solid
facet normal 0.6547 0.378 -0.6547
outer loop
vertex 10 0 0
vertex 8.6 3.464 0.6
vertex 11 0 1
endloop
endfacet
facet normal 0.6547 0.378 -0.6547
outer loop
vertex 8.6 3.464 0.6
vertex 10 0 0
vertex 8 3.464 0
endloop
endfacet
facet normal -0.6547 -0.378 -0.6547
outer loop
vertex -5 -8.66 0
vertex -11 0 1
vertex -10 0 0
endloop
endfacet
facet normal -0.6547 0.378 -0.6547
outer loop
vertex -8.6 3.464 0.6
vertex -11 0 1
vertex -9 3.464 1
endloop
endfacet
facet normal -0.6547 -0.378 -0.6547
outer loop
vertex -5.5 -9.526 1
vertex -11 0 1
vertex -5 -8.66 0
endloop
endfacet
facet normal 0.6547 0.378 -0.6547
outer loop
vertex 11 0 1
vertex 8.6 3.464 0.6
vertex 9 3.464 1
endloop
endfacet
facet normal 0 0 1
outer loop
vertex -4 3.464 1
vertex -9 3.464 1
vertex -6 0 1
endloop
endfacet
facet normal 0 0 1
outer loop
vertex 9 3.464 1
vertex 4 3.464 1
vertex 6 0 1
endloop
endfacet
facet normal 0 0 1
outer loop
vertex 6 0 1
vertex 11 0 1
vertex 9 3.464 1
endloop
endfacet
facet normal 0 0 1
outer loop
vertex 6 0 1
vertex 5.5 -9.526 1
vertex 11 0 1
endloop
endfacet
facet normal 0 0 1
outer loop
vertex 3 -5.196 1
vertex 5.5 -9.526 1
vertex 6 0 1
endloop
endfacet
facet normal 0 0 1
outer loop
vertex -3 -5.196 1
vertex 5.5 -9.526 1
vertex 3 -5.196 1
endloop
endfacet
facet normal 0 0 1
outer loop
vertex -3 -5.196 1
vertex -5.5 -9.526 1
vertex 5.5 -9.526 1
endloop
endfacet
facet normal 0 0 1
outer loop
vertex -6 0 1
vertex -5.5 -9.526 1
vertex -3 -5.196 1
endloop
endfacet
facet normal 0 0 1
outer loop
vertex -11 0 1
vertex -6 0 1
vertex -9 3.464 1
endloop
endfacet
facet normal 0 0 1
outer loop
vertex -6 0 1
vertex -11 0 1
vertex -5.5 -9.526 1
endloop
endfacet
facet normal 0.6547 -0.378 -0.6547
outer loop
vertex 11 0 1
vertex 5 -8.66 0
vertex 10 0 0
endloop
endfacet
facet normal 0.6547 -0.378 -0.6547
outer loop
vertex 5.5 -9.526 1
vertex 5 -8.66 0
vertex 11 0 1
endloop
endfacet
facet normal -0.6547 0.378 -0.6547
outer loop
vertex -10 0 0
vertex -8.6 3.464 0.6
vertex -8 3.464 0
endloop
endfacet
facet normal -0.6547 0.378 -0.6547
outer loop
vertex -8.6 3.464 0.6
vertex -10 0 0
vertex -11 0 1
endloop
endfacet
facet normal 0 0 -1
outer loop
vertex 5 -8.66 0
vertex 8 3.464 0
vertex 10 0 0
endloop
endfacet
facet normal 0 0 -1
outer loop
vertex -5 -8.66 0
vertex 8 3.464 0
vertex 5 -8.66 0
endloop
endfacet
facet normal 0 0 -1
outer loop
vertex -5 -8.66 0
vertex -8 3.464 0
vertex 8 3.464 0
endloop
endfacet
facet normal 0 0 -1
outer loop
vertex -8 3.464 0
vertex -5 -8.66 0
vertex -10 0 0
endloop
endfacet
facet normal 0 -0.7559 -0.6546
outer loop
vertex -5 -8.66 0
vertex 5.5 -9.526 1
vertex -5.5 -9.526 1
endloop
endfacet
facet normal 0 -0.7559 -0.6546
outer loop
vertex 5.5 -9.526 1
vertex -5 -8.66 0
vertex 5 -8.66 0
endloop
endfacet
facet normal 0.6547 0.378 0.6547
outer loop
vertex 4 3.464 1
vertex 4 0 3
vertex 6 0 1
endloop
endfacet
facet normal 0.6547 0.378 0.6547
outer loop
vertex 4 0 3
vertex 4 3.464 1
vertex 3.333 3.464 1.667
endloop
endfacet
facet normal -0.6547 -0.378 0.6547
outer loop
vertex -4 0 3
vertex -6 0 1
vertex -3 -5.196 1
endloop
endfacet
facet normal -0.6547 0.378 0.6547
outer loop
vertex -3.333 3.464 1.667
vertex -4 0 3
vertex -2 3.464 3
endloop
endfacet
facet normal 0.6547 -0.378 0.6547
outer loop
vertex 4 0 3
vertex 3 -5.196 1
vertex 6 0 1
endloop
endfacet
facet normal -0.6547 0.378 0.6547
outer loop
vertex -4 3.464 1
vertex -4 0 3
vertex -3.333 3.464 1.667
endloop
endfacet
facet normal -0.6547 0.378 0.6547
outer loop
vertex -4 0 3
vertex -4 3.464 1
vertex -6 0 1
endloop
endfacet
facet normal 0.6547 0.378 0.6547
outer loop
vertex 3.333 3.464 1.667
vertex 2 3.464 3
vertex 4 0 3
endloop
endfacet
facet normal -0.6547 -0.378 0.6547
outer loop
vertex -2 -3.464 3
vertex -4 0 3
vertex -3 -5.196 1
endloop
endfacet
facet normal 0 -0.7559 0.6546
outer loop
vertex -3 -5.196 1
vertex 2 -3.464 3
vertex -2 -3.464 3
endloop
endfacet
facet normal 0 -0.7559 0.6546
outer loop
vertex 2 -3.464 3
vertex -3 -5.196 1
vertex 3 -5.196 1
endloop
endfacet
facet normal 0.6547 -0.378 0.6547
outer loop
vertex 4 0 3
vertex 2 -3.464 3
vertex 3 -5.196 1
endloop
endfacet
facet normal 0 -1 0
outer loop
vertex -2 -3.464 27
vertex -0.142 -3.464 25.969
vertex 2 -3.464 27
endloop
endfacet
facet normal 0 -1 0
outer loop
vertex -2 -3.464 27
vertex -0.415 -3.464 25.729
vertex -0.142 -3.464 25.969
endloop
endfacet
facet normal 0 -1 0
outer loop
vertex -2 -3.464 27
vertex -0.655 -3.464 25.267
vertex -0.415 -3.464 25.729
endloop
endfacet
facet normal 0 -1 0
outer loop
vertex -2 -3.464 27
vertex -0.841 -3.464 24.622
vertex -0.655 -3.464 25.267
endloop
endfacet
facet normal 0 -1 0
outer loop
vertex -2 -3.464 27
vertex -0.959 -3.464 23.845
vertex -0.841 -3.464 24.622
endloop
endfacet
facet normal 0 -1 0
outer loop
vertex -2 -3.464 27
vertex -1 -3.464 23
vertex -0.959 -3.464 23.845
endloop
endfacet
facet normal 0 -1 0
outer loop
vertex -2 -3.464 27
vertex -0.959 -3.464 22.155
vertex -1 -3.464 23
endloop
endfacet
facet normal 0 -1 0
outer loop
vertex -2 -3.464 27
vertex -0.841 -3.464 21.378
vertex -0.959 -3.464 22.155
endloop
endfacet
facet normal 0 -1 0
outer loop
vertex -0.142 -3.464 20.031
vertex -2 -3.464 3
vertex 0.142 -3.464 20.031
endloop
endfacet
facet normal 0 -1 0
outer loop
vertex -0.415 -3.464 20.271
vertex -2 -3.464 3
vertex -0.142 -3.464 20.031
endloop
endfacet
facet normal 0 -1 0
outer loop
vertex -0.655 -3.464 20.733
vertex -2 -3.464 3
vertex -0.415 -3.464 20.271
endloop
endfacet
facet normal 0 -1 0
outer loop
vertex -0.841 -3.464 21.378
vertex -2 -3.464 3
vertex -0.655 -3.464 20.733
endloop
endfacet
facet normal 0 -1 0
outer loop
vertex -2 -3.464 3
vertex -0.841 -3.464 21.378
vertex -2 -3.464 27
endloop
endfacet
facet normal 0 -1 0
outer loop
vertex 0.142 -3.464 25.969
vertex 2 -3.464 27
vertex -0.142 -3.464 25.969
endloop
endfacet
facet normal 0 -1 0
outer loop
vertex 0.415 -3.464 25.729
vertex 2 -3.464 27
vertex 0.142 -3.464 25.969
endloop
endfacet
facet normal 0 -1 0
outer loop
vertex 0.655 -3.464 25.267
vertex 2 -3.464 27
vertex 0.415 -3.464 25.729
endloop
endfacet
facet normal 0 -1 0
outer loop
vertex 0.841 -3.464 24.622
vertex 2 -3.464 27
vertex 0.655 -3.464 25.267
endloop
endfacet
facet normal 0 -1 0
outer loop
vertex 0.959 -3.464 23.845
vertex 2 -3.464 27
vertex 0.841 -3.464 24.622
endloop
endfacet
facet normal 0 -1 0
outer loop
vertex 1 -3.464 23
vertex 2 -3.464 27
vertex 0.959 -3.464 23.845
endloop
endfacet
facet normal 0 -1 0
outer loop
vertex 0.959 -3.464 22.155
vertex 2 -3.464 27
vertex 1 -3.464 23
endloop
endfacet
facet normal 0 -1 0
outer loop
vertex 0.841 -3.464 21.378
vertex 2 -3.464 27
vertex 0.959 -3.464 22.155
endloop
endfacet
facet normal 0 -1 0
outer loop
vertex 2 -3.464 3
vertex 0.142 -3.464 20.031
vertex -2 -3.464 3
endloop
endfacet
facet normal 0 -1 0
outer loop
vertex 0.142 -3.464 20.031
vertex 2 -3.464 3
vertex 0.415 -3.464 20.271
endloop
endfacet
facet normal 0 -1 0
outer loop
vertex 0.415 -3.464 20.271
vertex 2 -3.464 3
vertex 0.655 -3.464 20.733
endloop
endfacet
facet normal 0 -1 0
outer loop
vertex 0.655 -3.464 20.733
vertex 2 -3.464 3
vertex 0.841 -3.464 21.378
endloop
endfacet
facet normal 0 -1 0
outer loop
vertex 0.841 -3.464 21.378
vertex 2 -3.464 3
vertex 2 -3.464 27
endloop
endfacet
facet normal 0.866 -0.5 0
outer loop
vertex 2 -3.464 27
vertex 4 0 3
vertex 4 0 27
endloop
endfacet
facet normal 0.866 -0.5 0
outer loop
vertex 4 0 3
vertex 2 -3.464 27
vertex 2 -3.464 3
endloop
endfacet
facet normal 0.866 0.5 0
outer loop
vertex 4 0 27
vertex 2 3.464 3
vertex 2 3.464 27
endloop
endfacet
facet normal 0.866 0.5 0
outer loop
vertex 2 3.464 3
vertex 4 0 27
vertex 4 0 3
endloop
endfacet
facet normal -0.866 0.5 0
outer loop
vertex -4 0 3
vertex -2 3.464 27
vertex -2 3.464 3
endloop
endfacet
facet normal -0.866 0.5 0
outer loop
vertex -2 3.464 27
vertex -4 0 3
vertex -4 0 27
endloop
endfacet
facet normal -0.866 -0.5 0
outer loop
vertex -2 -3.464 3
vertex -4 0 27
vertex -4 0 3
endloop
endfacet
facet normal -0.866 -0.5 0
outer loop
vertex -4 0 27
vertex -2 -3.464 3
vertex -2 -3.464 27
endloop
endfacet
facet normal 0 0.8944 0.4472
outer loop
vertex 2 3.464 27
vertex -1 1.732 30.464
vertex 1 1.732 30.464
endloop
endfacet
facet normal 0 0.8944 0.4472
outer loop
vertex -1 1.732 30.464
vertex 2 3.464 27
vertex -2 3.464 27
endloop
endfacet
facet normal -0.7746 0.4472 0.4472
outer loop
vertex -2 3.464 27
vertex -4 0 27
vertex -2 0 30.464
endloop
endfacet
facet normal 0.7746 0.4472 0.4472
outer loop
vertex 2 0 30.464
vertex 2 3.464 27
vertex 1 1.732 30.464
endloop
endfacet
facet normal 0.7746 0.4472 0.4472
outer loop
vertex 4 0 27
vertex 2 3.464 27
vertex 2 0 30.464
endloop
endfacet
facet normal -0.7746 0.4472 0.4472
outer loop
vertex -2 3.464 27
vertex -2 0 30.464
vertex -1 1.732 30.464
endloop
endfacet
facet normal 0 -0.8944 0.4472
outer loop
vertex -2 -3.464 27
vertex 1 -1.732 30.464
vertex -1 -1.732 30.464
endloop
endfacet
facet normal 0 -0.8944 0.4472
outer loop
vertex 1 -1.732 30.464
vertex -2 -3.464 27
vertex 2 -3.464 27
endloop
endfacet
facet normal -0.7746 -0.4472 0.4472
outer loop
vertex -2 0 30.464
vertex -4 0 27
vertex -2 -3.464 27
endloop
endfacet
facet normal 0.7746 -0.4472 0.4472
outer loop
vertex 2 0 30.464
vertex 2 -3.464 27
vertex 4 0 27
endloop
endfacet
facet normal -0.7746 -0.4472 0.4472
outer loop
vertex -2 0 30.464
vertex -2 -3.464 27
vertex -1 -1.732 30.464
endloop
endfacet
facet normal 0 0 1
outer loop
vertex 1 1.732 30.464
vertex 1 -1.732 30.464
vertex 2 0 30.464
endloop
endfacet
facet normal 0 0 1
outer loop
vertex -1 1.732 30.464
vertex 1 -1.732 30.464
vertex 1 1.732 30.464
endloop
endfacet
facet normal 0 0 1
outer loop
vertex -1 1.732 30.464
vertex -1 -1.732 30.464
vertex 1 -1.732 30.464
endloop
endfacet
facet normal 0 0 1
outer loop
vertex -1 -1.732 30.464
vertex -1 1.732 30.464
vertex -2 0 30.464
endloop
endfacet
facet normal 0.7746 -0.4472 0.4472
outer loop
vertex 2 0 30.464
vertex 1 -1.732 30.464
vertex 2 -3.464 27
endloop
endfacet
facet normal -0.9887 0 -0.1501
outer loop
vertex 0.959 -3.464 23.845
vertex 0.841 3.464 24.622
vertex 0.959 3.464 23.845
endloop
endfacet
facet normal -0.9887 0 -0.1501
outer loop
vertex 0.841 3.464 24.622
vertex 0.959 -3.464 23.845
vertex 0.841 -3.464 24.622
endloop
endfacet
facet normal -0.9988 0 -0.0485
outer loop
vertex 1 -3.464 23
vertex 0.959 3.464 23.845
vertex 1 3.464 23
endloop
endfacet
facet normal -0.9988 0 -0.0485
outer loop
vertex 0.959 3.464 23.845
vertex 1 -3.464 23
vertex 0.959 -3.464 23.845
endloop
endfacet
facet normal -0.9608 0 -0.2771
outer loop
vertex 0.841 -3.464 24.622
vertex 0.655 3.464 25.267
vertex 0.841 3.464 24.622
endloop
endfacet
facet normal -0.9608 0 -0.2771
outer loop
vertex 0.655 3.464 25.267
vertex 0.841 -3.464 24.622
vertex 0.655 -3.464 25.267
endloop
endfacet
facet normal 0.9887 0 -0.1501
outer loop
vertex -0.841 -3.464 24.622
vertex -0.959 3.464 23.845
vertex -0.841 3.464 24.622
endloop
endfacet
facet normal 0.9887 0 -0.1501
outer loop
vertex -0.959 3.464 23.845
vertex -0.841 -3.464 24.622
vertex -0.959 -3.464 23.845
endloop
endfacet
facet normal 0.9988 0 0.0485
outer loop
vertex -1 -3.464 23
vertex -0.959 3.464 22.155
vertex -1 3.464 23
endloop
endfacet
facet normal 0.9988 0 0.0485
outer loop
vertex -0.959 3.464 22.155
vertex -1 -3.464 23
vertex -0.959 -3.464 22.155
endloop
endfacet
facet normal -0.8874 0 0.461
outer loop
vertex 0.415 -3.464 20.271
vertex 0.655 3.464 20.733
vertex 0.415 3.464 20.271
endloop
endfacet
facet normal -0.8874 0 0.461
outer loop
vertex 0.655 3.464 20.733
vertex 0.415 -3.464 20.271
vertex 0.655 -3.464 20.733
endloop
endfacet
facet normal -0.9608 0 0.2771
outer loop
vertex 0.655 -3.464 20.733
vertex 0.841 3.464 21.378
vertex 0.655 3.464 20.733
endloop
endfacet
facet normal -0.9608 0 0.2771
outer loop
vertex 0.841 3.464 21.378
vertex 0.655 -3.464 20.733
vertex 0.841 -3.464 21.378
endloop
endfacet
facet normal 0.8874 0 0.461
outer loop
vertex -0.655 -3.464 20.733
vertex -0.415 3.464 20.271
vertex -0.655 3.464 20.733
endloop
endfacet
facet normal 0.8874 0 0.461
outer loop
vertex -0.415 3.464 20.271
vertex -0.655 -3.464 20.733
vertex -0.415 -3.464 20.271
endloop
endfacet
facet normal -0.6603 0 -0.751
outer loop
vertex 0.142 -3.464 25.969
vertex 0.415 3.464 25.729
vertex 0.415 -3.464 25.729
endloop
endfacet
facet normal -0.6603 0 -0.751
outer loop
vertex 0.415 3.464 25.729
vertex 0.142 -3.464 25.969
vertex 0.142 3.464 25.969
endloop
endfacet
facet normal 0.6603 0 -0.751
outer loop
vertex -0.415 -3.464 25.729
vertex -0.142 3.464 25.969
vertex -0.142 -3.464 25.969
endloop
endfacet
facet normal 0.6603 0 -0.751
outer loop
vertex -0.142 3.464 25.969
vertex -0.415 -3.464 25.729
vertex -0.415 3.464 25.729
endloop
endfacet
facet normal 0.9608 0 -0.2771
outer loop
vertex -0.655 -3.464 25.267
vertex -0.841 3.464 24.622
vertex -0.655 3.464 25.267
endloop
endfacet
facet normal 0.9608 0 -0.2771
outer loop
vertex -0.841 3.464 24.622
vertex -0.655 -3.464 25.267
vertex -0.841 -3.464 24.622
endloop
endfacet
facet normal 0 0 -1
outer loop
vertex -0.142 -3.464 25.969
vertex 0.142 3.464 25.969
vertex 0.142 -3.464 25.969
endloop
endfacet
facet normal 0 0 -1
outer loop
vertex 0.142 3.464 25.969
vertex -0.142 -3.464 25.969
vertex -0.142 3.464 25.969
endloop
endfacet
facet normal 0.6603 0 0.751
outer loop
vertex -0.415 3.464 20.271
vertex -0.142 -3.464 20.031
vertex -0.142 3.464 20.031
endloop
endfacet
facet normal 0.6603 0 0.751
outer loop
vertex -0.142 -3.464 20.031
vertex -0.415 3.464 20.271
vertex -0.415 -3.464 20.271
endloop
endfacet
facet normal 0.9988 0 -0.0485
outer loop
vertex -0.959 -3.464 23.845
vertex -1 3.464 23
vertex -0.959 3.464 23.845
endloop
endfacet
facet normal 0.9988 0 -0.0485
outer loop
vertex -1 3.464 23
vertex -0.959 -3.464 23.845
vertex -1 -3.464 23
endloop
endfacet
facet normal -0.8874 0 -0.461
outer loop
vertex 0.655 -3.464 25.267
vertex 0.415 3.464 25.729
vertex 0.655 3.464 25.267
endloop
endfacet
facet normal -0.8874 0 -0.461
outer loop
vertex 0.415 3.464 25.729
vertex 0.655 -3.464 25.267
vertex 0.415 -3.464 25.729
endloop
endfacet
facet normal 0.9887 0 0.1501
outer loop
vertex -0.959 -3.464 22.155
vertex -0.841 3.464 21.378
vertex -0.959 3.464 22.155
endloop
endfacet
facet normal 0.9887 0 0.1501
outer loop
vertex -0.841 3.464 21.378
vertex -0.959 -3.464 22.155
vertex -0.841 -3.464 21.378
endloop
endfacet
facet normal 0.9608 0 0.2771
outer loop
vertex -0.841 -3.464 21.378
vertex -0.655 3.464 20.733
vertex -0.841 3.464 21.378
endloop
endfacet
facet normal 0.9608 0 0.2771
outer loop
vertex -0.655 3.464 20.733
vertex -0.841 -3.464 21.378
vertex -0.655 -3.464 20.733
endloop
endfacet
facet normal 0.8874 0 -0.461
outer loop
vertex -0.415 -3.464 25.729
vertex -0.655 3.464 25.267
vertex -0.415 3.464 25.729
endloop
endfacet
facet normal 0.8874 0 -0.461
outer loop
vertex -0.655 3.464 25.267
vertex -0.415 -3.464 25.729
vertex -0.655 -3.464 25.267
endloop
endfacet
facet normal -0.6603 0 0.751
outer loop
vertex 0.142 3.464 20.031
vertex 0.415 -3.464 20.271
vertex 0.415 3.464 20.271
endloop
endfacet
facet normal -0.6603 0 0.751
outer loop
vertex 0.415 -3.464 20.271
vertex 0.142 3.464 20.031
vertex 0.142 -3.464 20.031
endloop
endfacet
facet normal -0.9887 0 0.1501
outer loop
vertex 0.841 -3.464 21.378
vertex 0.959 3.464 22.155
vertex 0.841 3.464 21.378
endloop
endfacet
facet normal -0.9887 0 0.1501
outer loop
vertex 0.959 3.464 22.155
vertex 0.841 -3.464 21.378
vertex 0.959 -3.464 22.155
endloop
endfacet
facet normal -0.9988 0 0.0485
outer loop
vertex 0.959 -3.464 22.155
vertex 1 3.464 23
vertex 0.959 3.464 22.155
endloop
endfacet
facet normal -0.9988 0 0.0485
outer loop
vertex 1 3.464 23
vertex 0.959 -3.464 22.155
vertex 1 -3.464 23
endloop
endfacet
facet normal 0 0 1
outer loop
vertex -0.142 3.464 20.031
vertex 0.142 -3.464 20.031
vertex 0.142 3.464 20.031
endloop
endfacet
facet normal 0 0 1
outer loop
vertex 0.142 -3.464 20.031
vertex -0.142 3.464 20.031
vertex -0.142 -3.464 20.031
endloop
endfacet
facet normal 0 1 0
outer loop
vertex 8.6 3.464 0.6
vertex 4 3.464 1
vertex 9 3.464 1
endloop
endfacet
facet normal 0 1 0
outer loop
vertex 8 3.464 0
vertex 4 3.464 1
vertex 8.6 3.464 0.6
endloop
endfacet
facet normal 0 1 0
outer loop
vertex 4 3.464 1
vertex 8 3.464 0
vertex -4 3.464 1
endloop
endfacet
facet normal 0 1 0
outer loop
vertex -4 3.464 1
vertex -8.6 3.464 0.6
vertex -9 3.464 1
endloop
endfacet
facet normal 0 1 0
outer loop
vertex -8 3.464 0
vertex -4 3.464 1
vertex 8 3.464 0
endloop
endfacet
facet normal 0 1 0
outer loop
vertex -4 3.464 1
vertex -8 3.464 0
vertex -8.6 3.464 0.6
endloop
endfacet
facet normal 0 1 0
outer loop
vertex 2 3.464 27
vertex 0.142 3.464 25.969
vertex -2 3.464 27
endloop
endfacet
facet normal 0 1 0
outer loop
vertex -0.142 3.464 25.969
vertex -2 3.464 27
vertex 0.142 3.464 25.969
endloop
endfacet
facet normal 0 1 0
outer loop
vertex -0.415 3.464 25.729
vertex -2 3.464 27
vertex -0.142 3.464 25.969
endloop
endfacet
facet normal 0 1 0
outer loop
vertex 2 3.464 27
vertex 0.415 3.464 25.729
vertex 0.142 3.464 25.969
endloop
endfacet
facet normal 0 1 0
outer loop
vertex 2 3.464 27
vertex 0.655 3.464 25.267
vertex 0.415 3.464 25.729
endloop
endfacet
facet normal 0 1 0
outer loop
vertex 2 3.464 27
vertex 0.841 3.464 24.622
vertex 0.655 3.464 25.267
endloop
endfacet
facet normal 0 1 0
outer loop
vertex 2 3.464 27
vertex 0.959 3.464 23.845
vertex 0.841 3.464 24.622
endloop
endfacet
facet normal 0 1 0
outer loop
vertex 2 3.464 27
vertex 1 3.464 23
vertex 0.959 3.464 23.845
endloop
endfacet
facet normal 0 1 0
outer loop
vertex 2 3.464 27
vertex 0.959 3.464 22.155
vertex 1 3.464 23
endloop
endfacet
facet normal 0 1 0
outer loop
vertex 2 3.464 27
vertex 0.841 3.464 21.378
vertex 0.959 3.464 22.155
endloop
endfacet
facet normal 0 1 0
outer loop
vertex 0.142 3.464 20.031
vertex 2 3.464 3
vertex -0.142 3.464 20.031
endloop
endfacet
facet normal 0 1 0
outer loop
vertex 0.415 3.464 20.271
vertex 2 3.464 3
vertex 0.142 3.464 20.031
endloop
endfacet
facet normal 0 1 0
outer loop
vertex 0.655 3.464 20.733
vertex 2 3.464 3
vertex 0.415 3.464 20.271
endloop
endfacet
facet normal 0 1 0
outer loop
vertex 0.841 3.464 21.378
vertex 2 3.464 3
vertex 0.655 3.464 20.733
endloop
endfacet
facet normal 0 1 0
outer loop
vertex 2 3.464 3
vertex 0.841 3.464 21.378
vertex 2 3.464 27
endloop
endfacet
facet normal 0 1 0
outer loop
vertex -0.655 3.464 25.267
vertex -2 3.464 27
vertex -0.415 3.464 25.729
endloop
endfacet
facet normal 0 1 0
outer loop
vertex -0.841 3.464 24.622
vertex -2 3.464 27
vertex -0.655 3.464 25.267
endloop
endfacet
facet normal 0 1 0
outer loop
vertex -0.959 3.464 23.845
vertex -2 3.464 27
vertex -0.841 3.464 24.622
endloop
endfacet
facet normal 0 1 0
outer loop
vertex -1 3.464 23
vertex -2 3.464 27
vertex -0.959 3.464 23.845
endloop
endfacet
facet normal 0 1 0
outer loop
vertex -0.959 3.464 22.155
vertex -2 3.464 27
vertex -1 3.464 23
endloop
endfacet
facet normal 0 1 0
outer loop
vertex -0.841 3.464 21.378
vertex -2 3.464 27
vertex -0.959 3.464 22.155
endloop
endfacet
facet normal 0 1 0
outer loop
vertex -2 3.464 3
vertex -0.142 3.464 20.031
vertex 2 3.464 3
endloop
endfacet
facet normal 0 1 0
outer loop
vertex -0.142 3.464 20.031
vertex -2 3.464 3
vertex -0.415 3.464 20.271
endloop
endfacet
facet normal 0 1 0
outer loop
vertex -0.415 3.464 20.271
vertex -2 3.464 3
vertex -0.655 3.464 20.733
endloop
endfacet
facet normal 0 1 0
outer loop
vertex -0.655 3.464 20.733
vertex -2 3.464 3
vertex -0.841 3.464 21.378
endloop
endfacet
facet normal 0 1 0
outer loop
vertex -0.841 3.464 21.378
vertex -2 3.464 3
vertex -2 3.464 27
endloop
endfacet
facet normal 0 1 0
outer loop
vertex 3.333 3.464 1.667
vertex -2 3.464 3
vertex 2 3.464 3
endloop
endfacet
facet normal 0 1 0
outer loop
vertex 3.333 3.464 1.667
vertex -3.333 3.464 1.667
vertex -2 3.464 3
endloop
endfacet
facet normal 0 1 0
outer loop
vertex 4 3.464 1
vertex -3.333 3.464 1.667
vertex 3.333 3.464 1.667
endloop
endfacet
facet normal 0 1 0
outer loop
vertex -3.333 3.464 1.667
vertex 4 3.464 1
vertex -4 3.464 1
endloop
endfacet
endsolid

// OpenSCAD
//=========================================================
// wings.scad
//
// parts for folding wings
//
// Dr Tom Flint, 6 Jan 2023
//=========================================================

use <../Parts/threads.scad>


layer = 0.3;        // thickness of 1 layer
thick = 4*layer;    // thickness of the hub

rbasehole = 7;
rflange = 10;
rwasher = 15;
space = 11;

rlever = 30.2/2;
rinner = 25.0/2;

zlever = 9;

hi = space+2*thick;
F=200;

tall=26;

//---------------------------------------------------------
module pivota(){

  difference(){
    union(){
      cylinder(r=rbasehole-0.3,h=hi,$fn=F);
      translate([0,0,hi])
      cylinder(r1=rflange,r2=rflange+1,h=thick,$fn=F);
    }
    
    
    metric_thread (diameter=10, pitch=2, length=hi-1, internal=true);
    translate([0,0,hi+thick])
    cube([2,7,10],center=true);
  }
}

//---------------------------------------------------------
module pivotb(){

$fn=89;

  difference(){
    metric_thread (diameter=9.25, pitch=2, length=hi-2, internal=false, leadin=1);
    cylinder(r=2,h=2*hi,center=true,$fn=22);
  }
  difference(){
    translate([0,0,-thick])
    cylinder(r1=rflange+1,r2=rflange,h=thick,$fn=F);
    translate([0,0,-thick])

    cube([2,4,10],center=true);
  }

}

//--------------------------------------------------------------
module levera(){


    difference(){
      union(){
        cylinder(r=rlever+thick,h=zlever,$fn=F);
        cylinder(r1=rlever+thick+8,r2=rlever+8,h=thick,$fn=F);
        translate([0,0,thick])
        cylinder(r1=rlever+thick+2,r2=rlever+thick,h=2,$fn=F);
      }
      translate([0,0,-1])
      cylinder(r=rlever,h=zlever+2,$fn=F);
      translate([0,0,0.5*zlever])
      rotate([90,0,0])
      cylinder(r=2,h=50,center=true,$fn=45);

        translate([0,0,0])
        cylinder(r1=rlever+1,r2=rlever,h=1,$fn=F);
    }
      
}

//--------------------------------------------------------------
module leverb(){


    difference(){
      union(){
        cylinder(r=rinner,h=zlever,$fn=F);
      }
      translate([0,0,thick])
      cylinder(r=rinner-thick,h=zlever+2,$fn=F);
      cylinder(r1=rinner-2*thick,r2=rinner-thick,h=thick,$fn=F);

      translate([0,0,zlever/2])
      rotate([90,0,0])
      cylinder(r=2,h=50,center=true,$fn=45);
    }
    difference(){
      hull(){
        translate([0,0,-thick])
        cylinder(r=rinner+4*thick,h=thick,$fn=F);
        translate([0,50,-thick])
        cylinder(r=rinner/2,h=thick,$fn=F);
      }
      translate([0,0,-thick])
      cylinder(r=rinner-3*thick,h=20,center=true,$fn=F);
      translate([0,50,-thick])
      cylinder(r=2.5,h=20,center=true,$fn=F);
      translate([0,37,-thick])
      cylinder(r=4,h=20,center=true,$fn=F);
      translate([0,22,-thick])
      cylinder(r=6,h=20,center=true,$fn=F);
    }
}

//--------------------------------------------------------------
module washer(){

    difference(){
      cylinder(r1=rwasher,r2=rwasher+2*thick,h=2*thick,$fn=F);
      cylinder(r1=rflange+1,r2=rflange,h=thick,$fn=F);
      cylinder(r=rbasehole,h=hi,$fn=F);
    }
      
}

//---------------------------------------------------------
module pivotc(extra=9){


$fn=89;
  difference(){
    union(){
      translate([0,0,extra])
      metric_thread (diameter=9.25, pitch=2, length=hi-2, internal=false, leadin=1);
      cylinder(r=rbasehole-0.3,h=extra,$fn=F);
      translate([0,0,-thick])
      cylinder(r1=rflange+1,r2=rflange,h=thick,$fn=F);
    }
    
    translate([0,0,extra])
    cylinder(r=2,h=2*hi,center=true,$fn=22);
    translate([0,0,0])
    cylinder(r1=4,r2=2,h=0.75*extra,$fn=22);
    translate([0,0,-thick])
    cube([2,8,2*thick],center=true);
  }

}

//--------------------------------------------------------------
module washer2(){

    difference(){
      cylinder(r1=rwasher,r2=rwasher+2*thick,h=3*thick,$fn=F);
      translate([0,0,-0.1])
      cylinder(r1=rflange+2*thick,r2=rflange,h=2*thick+0.1,$fn=F);
      cylinder(r=rbasehole,h=hi,$fn=F);
    }
      
}


//------------------------------------------------------------
module pivotd(){

  difference(){
    union(){
      cylinder(r=rbasehole-0.15,h=tall,$fn=F);
      translate([0,0,-2*thick])
      cylinder(r1=rflange+2*thick,r2=rflange,h=2*thick,$fn=F);
  
      
      translate([thick,0,tall])
      cylinder(r1=rbasehole,r2=rbasehole-thick,h=2*thick,$fn=F);
      translate([-thick,0,tall])
      cylinder(r1=rbasehole,r2=rbasehole-thick,h=2*thick,$fn=F);
    }
    
    // cut for compression
    translate([0,0,tall])
    cube([2*thick,20,tall],center=true);
    
    // round out compression cut for stress relief
    translate([0,0,0.5*tall])
    rotate([90,0,0])
    cylinder(r=thick,h=20,center=true,$fn=F);

    // side cut to make printable
    translate([0,10,0.5*tall])
    cube([20,10,2*tall],center=true);
    
    // divot to help install tabs
    translate([3.5,0,tall+1])
    cylinder(r=0.6,h=2*thick,$fn=F);

    // divot to help install tabs
    translate([-3.5,0,tall+1])
    cylinder(r=0.6,h=2*thick,$fn=F);

  }
}

//---------------------------------------------------------
module wedged(){

    translate([0,0,tall/2+5])
    //cube([2*thick-0.15,2*rbasehole-0.3,0.5*tall],center=true);
    linear_extrude(height=0.5*tall,scale=[1.3,1])
    square([2*thick-0.15-0.5,2*rbasehole-0.3-0.5],center=true);

    translate([0,0,tall+4])
    cube([2*thick-0.15,2*rbasehole+2*thick,2*thick],center=true);
}


//---------------------------------------------------------
module anchor(){
  
hi=24;
  
  difference(){
    union(){
      cylinder(r1=10,r2=11,h=1,$fn=44);
      translate([0,0,1])
      cylinder(r1=6,r2=4,h=2,$fn=44);
      translate([0,0,3])
      cylinder(r=4,h=hi,$fn=44);
      translate([0,0,hi+3])
      sphere(r=4,$fn=33);
    }
    translate([0,0,hi-1])
    rotate([0,90,0])
    scale([1.5,1,1])
    cylinder(r=2,h=10,center=true,$fn=22);

    translate([0,0,-1])
    cylinder(r=1,h=hi+10,$fn=22);
  }
}

//---------------------------------------------------------
module anchor2(){
  
hi=24;
  
  difference(){
    union(){
      cylinder(r1=10,r2=11,h=1,$fn=6);
      translate([0,0,1])
      cylinder(r1=6,r2=4,h=2,$fn=6);
      translate([0,0,3])
      cylinder(r=4,h=hi,$fn=6);
      translate([0,0,hi+3])
      sphere(r=4,$fn=6);
    }
    translate([0,0,hi-1])
    rotate([90,0,0])
    scale([1,3,1])
    cylinder(r=1,h=10,center=true,$fn=22);

    translate([-20,4*0.866,-1])
    cube([40,40,40]);
  }
}

//=========================================================

if(0){
  difference(){
    union(){
      translate([0,0,2*thick])
//      pivota();
      color("red")
//      pivotb();
      pivotd();
      color("cyan")
      wedged();
      washer2();
      translate([0,0,30.5])
      rotate([180,0,0])
      washer2();
      
    }
    translate([0,20,8])
    cube([40,40,80],center=true);
  }
}

//pivota();
//pivotb();
//translate([40,0,0])
//pivotc();

//pivotd();
//washer2();
//wedged();

//translate([60,0,0])
//levera();

//leverb();

anchor2();

//=========================================================
